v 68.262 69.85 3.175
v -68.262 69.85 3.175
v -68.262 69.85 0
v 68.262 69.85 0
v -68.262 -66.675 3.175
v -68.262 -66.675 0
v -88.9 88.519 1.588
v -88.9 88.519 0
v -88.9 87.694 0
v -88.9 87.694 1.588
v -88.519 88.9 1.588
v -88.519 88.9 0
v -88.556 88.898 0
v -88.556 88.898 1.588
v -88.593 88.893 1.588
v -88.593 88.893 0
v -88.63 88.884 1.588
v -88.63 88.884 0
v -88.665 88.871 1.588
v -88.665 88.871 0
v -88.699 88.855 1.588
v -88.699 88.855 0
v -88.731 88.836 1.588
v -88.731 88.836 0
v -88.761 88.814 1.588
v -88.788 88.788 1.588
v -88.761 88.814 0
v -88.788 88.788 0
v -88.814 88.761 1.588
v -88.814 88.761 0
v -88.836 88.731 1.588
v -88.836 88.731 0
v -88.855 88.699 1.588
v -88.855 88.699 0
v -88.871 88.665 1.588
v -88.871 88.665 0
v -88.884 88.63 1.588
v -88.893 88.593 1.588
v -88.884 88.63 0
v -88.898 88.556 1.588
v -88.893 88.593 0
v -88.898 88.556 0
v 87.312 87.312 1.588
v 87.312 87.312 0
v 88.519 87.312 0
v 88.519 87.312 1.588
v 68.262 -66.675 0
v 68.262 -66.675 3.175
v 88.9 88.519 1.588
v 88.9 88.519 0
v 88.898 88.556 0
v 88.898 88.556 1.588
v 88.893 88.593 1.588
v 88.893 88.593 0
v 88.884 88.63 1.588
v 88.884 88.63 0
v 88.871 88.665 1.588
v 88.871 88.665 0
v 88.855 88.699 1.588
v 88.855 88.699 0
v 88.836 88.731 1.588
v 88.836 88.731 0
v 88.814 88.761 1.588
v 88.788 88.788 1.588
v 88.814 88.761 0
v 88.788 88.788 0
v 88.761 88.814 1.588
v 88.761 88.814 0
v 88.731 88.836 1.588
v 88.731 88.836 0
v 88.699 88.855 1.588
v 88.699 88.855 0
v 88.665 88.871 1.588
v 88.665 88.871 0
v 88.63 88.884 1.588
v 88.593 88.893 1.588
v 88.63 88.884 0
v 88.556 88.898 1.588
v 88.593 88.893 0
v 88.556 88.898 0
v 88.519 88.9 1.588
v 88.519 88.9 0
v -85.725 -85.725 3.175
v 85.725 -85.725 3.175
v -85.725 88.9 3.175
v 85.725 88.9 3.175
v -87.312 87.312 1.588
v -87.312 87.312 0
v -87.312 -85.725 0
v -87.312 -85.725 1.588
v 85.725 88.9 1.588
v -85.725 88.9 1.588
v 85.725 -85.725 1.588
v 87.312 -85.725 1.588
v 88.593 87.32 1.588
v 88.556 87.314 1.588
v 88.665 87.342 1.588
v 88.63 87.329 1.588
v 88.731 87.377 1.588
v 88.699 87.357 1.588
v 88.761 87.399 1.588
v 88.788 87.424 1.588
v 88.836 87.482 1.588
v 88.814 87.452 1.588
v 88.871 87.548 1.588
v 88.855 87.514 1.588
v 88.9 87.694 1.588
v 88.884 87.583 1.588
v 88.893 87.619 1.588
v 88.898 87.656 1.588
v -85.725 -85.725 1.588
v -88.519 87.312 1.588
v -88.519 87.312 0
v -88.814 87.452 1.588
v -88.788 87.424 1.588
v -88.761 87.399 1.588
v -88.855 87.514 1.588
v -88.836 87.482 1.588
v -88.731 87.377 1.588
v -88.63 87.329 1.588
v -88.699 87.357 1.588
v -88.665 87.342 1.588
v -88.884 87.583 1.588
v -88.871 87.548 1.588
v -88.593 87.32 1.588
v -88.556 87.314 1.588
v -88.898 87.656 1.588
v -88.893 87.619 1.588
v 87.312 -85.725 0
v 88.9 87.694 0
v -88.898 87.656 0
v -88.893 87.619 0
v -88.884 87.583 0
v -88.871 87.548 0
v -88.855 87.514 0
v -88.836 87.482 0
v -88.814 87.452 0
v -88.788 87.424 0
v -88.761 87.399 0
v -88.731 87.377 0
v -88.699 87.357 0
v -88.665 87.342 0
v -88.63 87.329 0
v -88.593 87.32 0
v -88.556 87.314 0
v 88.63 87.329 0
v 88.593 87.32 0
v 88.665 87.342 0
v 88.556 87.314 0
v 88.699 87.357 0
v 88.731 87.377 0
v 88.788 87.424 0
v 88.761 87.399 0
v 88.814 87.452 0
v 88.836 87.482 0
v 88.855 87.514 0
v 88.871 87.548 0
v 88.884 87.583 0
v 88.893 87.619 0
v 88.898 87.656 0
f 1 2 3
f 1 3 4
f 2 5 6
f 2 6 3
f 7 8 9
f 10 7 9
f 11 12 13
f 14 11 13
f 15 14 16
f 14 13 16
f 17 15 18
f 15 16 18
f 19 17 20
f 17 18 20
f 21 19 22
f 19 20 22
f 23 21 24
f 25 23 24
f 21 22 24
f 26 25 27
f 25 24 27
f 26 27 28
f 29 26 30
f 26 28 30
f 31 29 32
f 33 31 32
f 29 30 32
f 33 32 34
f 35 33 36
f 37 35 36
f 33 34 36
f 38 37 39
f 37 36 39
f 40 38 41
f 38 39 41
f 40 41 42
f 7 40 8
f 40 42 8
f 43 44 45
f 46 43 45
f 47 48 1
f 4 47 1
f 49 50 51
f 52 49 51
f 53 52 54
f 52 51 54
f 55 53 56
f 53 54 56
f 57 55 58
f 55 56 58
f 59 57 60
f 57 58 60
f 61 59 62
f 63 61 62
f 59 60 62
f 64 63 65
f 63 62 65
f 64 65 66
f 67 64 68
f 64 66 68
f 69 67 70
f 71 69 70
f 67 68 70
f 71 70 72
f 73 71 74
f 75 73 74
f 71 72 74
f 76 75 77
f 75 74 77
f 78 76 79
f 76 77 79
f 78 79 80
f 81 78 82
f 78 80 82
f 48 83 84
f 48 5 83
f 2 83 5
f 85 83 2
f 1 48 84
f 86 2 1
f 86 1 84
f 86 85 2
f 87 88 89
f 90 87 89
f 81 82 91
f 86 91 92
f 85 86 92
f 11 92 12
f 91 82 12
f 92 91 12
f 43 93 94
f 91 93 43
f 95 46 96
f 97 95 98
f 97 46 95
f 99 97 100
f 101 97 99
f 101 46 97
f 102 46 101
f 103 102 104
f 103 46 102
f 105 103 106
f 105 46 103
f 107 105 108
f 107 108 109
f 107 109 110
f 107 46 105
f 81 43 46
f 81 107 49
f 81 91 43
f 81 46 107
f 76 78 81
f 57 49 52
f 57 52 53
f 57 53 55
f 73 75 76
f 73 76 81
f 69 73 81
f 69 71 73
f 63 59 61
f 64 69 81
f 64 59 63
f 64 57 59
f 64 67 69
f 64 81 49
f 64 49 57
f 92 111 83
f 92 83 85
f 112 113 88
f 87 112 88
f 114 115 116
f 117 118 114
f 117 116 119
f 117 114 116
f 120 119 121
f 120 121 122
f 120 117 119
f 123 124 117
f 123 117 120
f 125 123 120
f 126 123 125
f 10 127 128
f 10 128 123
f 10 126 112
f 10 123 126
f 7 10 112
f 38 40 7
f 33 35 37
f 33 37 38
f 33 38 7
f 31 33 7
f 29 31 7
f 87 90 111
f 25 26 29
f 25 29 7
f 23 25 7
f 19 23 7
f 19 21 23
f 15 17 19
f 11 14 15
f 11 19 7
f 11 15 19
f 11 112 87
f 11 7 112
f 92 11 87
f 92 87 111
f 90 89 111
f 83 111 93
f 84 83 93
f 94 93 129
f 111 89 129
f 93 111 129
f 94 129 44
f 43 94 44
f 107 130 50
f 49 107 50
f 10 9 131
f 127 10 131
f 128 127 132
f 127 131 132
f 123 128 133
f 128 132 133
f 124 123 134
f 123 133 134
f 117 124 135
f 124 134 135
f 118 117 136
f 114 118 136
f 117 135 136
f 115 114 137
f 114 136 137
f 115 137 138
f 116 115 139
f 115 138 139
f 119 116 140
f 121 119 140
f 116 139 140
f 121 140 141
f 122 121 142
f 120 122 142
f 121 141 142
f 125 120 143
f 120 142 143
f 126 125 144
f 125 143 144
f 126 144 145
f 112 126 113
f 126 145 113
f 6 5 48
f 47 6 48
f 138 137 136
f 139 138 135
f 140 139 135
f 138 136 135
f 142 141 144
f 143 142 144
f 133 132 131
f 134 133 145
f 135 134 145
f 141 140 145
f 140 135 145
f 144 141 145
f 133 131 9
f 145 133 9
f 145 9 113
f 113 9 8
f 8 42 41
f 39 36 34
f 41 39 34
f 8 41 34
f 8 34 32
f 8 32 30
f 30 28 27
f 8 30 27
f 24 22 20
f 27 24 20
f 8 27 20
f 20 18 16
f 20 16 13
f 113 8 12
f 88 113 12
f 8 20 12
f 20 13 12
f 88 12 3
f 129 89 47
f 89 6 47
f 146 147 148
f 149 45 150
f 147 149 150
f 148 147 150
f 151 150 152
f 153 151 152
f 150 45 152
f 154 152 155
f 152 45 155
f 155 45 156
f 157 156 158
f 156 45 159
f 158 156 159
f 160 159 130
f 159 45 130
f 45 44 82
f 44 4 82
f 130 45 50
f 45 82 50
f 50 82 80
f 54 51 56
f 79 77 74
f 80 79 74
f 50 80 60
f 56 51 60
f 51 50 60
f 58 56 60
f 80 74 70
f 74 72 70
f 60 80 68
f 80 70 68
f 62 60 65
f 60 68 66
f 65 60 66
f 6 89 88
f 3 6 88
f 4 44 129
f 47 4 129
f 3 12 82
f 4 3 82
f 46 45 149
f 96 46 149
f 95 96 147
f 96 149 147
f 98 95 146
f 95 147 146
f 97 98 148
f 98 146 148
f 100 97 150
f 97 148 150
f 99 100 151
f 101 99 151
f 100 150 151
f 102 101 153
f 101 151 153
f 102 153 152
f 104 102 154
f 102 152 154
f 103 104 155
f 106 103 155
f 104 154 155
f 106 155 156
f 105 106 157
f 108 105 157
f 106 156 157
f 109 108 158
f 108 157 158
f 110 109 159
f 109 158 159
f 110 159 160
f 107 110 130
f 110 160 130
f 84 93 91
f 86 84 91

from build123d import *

# Parameters (mm, degrees)
F1_DEPTH = 1.5875
F2_W     = 171.45
F2_H     = 174.625
F3_DEPTH = 1.5875
F4_W     = 136.525
F4_H     = 136.525
F5_DEPTH = 25.4


with BuildPart() as f1:
    # F0 (on Top) → F1 (new body)
    with BuildSketch(Plane.XY):
        with BuildLine():
            Line((87.3125, 88.9), (-87.3125, 88.9))
            Line((-87.3125, 88.9), (-88.519, 88.9))
            ThreePointArc((-88.519, 88.9), (-88.788408, 88.788408), (-88.9, 88.519))
            Line((-88.9, 88.519), (-88.9, 87.6935))
            ThreePointArc((-88.9, 87.6935), (-88.788408, 87.424092), (-88.519, 87.3125))
            Line((-88.519, 87.3125), (-87.3125, 87.3125))
            Line((-87.3125, 87.3125), (-87.3125, -85.725))
            Line((-87.3125, -85.725), (87.3125, -85.725))
            Line((87.3125, -85.725), (87.3125, 87.3125))
            Line((87.3125, 87.3125), (88.519, 87.3125))
            ThreePointArc((88.519, 87.3125), (88.788408, 87.424092), (88.9, 87.6935))
            Line((88.9, 87.6935), (88.9, 88.519))
            ThreePointArc((88.9, 88.519), (88.788408, 88.788408), (88.519, 88.9))
            Line((88.519, 88.9), (87.3125, 88.9))
        make_face()
    extrude(amount=F1_DEPTH)

    # F2 (on face) → F3 (join)
    with BuildSketch(Plane.XY.offset(1.5875)):
        with Locations((0, 1.5875)):
            Rectangle(F2_W, F2_H)
    extrude(amount=F3_DEPTH)

    # F4 (on face) → F5 (cut)
    with BuildSketch(Plane.XY.offset(3.175)):
        with Locations((0, 1.5875)):
            Rectangle(F4_W, F4_H)
    extrude(amount=-F5_DEPTH, mode=Mode.SUBTRACT)


solid = f1.part
